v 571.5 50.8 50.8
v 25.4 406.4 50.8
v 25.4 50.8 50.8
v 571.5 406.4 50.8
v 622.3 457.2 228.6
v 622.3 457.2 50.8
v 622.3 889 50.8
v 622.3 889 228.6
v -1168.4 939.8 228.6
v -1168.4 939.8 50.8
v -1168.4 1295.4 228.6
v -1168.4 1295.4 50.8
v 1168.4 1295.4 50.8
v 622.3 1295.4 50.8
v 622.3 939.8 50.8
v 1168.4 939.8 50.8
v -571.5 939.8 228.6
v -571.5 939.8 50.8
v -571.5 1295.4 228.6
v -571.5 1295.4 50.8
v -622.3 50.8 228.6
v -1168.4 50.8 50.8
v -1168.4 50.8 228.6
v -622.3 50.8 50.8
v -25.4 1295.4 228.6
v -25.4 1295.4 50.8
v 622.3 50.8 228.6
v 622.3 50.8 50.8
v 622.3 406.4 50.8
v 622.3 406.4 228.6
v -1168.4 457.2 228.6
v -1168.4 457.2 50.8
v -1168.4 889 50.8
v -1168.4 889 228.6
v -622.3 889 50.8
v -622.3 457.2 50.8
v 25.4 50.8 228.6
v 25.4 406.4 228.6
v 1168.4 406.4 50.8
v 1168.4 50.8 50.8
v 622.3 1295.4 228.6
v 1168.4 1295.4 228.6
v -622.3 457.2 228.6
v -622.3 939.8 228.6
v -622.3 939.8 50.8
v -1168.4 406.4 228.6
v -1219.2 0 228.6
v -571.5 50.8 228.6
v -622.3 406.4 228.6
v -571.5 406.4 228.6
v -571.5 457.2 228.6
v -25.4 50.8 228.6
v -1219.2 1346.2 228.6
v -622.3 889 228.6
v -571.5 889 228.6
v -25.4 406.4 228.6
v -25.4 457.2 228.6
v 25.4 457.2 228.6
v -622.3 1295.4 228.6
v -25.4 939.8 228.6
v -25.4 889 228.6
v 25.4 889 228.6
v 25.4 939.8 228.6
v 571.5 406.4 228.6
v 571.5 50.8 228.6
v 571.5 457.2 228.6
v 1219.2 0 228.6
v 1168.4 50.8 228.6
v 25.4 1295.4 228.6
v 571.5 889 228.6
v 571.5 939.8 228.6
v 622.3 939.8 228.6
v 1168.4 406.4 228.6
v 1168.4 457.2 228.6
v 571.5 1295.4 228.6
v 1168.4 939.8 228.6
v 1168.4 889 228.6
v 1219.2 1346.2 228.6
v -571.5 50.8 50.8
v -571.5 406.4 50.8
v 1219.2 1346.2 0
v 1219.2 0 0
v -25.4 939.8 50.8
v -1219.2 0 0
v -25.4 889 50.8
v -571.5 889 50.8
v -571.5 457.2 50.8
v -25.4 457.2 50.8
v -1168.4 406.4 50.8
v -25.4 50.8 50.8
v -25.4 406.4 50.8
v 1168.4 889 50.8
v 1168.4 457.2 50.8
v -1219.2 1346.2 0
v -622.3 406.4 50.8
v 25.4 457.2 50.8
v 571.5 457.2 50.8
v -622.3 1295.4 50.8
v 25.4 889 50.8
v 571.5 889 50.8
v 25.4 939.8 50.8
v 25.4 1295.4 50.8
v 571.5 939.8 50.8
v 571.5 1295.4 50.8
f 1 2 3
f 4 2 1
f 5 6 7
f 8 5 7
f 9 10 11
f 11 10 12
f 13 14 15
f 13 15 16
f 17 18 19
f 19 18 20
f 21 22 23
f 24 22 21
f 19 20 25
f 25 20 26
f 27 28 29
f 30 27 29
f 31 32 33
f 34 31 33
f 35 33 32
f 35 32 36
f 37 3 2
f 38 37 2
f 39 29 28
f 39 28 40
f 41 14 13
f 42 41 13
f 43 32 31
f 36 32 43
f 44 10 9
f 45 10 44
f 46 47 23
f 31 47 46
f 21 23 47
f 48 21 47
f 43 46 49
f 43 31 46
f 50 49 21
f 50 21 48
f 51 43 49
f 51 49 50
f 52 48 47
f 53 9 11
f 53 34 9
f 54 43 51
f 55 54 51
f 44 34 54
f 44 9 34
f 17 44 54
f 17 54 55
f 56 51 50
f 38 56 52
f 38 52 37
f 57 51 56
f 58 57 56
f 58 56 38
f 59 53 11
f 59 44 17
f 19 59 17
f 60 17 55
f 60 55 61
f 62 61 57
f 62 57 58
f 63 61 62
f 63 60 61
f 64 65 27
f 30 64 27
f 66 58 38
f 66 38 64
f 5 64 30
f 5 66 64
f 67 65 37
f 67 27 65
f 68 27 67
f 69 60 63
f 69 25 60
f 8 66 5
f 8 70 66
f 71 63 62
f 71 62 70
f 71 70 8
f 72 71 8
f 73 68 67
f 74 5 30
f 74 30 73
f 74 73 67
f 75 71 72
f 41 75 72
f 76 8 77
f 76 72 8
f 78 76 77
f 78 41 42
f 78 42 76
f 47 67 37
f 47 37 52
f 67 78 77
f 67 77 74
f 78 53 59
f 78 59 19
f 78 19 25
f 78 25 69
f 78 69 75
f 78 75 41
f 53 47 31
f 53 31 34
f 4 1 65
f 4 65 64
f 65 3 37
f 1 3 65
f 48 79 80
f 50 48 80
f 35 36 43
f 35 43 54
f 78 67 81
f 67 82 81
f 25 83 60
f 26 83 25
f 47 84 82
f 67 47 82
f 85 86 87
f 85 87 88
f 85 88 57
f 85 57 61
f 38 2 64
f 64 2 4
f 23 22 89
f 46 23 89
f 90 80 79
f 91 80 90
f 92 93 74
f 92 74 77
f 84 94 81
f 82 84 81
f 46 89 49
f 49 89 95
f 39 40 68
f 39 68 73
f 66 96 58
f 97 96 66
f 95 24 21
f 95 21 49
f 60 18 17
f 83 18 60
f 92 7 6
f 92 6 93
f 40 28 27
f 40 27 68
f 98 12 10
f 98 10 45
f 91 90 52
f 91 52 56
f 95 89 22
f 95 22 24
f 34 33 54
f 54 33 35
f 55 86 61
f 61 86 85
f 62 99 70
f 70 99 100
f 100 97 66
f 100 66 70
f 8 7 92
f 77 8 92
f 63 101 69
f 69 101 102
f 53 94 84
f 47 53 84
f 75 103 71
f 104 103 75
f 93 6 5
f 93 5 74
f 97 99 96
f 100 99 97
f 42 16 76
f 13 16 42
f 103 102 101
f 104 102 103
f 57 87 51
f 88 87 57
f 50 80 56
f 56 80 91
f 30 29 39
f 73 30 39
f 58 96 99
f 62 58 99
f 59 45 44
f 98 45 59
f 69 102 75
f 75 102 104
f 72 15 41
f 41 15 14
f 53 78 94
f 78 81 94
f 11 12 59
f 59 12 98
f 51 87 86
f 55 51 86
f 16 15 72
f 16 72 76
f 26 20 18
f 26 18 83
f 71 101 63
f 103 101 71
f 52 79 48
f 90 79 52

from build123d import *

# Parameters (mm, degrees)
F0_W     = 2438.4
F0_H     = 1346.2
F1_DEPTH = 50.8
F2_W     = 546.1
F2_H     = 355.6
F2_H_2   = 431.8
F3_DEPTH = 177.8


with BuildPart() as f1:
    # F0 (on Top) → F1 (new body)
    with BuildSketch(Plane.XY):
        with Locations((0, 673.1)):
            Rectangle(F0_W, F0_H)
    extrude(amount=F1_DEPTH)

    # F2 (on face) → F3 (join)
    with BuildSketch(Plane.XY.offset(50.8)):
        Polygon((-1219.2, 457.2), (-1219.2, 406.4), (-1219.2, 50.8), (-1219.2, 0), (-1168.4, 0), (-622.3, 0), (-571.5, 0), (-25.4, 0), (25.4, 0), (571.5, 0), (622.3, 0), (1168.4, 0), (1219.2, 0), (1219.2, 50.8), (1219.2, 406.4), (1219.2, 457.2), (1219.2, 889), (1219.2, 939.8), (1219.2, 1295.4), (1219.2, 1346.2), (1168.4, 1346.2), (622.3, 1346.2), (571.5, 1346.2), (25.4, 1346.2), (-25.4, 1346.2), (-571.5, 1346.2), (-622.3, 1346.2), (-1168.4, 1346.2), (-1219.2, 1346.2), (-1219.2, 1295.4), (-1219.2, 939.8), (-1219.2, 889), align=None)
        with Locations((-895.35, 228.6)):
            Rectangle(F2_W, F2_H, mode=Mode.SUBTRACT)
        with Locations((-298.45, 228.6)):
            Rectangle(F2_W, F2_H, mode=Mode.SUBTRACT)
        with Locations((298.45, 228.6)):
            Rectangle(F2_W, F2_H, mode=Mode.SUBTRACT)
        with Locations((895.35, 228.6)):
            Rectangle(F2_W, F2_H, mode=Mode.SUBTRACT)
        with Locations((-895.35, 673.1)):
            Rectangle(F2_W, F2_H_2, mode=Mode.SUBTRACT)
        with Locations((-298.45, 673.1)):
            Rectangle(F2_W, F2_H_2, mode=Mode.SUBTRACT)
        with Locations((-895.35, 1117.6)):
            Rectangle(F2_W, F2_H, mode=Mode.SUBTRACT)
        with Locations((-298.45, 1117.6)):
            Rectangle(F2_W, F2_H, mode=Mode.SUBTRACT)
        with Locations((298.45, 673.1)):
            Rectangle(F2_W, F2_H_2, mode=Mode.SUBTRACT)
        with Locations((895.35, 673.1)):
            Rectangle(F2_W, F2_H_2, mode=Mode.SUBTRACT)
        with Locations((298.45, 1117.6)):
            Rectangle(F2_W, F2_H, mode=Mode.SUBTRACT)
        with Locations((895.35, 1117.6)):
            Rectangle(F2_W, F2_H, mode=Mode.SUBTRACT)
    extrude(amount=F3_DEPTH)


solid = f1.part
